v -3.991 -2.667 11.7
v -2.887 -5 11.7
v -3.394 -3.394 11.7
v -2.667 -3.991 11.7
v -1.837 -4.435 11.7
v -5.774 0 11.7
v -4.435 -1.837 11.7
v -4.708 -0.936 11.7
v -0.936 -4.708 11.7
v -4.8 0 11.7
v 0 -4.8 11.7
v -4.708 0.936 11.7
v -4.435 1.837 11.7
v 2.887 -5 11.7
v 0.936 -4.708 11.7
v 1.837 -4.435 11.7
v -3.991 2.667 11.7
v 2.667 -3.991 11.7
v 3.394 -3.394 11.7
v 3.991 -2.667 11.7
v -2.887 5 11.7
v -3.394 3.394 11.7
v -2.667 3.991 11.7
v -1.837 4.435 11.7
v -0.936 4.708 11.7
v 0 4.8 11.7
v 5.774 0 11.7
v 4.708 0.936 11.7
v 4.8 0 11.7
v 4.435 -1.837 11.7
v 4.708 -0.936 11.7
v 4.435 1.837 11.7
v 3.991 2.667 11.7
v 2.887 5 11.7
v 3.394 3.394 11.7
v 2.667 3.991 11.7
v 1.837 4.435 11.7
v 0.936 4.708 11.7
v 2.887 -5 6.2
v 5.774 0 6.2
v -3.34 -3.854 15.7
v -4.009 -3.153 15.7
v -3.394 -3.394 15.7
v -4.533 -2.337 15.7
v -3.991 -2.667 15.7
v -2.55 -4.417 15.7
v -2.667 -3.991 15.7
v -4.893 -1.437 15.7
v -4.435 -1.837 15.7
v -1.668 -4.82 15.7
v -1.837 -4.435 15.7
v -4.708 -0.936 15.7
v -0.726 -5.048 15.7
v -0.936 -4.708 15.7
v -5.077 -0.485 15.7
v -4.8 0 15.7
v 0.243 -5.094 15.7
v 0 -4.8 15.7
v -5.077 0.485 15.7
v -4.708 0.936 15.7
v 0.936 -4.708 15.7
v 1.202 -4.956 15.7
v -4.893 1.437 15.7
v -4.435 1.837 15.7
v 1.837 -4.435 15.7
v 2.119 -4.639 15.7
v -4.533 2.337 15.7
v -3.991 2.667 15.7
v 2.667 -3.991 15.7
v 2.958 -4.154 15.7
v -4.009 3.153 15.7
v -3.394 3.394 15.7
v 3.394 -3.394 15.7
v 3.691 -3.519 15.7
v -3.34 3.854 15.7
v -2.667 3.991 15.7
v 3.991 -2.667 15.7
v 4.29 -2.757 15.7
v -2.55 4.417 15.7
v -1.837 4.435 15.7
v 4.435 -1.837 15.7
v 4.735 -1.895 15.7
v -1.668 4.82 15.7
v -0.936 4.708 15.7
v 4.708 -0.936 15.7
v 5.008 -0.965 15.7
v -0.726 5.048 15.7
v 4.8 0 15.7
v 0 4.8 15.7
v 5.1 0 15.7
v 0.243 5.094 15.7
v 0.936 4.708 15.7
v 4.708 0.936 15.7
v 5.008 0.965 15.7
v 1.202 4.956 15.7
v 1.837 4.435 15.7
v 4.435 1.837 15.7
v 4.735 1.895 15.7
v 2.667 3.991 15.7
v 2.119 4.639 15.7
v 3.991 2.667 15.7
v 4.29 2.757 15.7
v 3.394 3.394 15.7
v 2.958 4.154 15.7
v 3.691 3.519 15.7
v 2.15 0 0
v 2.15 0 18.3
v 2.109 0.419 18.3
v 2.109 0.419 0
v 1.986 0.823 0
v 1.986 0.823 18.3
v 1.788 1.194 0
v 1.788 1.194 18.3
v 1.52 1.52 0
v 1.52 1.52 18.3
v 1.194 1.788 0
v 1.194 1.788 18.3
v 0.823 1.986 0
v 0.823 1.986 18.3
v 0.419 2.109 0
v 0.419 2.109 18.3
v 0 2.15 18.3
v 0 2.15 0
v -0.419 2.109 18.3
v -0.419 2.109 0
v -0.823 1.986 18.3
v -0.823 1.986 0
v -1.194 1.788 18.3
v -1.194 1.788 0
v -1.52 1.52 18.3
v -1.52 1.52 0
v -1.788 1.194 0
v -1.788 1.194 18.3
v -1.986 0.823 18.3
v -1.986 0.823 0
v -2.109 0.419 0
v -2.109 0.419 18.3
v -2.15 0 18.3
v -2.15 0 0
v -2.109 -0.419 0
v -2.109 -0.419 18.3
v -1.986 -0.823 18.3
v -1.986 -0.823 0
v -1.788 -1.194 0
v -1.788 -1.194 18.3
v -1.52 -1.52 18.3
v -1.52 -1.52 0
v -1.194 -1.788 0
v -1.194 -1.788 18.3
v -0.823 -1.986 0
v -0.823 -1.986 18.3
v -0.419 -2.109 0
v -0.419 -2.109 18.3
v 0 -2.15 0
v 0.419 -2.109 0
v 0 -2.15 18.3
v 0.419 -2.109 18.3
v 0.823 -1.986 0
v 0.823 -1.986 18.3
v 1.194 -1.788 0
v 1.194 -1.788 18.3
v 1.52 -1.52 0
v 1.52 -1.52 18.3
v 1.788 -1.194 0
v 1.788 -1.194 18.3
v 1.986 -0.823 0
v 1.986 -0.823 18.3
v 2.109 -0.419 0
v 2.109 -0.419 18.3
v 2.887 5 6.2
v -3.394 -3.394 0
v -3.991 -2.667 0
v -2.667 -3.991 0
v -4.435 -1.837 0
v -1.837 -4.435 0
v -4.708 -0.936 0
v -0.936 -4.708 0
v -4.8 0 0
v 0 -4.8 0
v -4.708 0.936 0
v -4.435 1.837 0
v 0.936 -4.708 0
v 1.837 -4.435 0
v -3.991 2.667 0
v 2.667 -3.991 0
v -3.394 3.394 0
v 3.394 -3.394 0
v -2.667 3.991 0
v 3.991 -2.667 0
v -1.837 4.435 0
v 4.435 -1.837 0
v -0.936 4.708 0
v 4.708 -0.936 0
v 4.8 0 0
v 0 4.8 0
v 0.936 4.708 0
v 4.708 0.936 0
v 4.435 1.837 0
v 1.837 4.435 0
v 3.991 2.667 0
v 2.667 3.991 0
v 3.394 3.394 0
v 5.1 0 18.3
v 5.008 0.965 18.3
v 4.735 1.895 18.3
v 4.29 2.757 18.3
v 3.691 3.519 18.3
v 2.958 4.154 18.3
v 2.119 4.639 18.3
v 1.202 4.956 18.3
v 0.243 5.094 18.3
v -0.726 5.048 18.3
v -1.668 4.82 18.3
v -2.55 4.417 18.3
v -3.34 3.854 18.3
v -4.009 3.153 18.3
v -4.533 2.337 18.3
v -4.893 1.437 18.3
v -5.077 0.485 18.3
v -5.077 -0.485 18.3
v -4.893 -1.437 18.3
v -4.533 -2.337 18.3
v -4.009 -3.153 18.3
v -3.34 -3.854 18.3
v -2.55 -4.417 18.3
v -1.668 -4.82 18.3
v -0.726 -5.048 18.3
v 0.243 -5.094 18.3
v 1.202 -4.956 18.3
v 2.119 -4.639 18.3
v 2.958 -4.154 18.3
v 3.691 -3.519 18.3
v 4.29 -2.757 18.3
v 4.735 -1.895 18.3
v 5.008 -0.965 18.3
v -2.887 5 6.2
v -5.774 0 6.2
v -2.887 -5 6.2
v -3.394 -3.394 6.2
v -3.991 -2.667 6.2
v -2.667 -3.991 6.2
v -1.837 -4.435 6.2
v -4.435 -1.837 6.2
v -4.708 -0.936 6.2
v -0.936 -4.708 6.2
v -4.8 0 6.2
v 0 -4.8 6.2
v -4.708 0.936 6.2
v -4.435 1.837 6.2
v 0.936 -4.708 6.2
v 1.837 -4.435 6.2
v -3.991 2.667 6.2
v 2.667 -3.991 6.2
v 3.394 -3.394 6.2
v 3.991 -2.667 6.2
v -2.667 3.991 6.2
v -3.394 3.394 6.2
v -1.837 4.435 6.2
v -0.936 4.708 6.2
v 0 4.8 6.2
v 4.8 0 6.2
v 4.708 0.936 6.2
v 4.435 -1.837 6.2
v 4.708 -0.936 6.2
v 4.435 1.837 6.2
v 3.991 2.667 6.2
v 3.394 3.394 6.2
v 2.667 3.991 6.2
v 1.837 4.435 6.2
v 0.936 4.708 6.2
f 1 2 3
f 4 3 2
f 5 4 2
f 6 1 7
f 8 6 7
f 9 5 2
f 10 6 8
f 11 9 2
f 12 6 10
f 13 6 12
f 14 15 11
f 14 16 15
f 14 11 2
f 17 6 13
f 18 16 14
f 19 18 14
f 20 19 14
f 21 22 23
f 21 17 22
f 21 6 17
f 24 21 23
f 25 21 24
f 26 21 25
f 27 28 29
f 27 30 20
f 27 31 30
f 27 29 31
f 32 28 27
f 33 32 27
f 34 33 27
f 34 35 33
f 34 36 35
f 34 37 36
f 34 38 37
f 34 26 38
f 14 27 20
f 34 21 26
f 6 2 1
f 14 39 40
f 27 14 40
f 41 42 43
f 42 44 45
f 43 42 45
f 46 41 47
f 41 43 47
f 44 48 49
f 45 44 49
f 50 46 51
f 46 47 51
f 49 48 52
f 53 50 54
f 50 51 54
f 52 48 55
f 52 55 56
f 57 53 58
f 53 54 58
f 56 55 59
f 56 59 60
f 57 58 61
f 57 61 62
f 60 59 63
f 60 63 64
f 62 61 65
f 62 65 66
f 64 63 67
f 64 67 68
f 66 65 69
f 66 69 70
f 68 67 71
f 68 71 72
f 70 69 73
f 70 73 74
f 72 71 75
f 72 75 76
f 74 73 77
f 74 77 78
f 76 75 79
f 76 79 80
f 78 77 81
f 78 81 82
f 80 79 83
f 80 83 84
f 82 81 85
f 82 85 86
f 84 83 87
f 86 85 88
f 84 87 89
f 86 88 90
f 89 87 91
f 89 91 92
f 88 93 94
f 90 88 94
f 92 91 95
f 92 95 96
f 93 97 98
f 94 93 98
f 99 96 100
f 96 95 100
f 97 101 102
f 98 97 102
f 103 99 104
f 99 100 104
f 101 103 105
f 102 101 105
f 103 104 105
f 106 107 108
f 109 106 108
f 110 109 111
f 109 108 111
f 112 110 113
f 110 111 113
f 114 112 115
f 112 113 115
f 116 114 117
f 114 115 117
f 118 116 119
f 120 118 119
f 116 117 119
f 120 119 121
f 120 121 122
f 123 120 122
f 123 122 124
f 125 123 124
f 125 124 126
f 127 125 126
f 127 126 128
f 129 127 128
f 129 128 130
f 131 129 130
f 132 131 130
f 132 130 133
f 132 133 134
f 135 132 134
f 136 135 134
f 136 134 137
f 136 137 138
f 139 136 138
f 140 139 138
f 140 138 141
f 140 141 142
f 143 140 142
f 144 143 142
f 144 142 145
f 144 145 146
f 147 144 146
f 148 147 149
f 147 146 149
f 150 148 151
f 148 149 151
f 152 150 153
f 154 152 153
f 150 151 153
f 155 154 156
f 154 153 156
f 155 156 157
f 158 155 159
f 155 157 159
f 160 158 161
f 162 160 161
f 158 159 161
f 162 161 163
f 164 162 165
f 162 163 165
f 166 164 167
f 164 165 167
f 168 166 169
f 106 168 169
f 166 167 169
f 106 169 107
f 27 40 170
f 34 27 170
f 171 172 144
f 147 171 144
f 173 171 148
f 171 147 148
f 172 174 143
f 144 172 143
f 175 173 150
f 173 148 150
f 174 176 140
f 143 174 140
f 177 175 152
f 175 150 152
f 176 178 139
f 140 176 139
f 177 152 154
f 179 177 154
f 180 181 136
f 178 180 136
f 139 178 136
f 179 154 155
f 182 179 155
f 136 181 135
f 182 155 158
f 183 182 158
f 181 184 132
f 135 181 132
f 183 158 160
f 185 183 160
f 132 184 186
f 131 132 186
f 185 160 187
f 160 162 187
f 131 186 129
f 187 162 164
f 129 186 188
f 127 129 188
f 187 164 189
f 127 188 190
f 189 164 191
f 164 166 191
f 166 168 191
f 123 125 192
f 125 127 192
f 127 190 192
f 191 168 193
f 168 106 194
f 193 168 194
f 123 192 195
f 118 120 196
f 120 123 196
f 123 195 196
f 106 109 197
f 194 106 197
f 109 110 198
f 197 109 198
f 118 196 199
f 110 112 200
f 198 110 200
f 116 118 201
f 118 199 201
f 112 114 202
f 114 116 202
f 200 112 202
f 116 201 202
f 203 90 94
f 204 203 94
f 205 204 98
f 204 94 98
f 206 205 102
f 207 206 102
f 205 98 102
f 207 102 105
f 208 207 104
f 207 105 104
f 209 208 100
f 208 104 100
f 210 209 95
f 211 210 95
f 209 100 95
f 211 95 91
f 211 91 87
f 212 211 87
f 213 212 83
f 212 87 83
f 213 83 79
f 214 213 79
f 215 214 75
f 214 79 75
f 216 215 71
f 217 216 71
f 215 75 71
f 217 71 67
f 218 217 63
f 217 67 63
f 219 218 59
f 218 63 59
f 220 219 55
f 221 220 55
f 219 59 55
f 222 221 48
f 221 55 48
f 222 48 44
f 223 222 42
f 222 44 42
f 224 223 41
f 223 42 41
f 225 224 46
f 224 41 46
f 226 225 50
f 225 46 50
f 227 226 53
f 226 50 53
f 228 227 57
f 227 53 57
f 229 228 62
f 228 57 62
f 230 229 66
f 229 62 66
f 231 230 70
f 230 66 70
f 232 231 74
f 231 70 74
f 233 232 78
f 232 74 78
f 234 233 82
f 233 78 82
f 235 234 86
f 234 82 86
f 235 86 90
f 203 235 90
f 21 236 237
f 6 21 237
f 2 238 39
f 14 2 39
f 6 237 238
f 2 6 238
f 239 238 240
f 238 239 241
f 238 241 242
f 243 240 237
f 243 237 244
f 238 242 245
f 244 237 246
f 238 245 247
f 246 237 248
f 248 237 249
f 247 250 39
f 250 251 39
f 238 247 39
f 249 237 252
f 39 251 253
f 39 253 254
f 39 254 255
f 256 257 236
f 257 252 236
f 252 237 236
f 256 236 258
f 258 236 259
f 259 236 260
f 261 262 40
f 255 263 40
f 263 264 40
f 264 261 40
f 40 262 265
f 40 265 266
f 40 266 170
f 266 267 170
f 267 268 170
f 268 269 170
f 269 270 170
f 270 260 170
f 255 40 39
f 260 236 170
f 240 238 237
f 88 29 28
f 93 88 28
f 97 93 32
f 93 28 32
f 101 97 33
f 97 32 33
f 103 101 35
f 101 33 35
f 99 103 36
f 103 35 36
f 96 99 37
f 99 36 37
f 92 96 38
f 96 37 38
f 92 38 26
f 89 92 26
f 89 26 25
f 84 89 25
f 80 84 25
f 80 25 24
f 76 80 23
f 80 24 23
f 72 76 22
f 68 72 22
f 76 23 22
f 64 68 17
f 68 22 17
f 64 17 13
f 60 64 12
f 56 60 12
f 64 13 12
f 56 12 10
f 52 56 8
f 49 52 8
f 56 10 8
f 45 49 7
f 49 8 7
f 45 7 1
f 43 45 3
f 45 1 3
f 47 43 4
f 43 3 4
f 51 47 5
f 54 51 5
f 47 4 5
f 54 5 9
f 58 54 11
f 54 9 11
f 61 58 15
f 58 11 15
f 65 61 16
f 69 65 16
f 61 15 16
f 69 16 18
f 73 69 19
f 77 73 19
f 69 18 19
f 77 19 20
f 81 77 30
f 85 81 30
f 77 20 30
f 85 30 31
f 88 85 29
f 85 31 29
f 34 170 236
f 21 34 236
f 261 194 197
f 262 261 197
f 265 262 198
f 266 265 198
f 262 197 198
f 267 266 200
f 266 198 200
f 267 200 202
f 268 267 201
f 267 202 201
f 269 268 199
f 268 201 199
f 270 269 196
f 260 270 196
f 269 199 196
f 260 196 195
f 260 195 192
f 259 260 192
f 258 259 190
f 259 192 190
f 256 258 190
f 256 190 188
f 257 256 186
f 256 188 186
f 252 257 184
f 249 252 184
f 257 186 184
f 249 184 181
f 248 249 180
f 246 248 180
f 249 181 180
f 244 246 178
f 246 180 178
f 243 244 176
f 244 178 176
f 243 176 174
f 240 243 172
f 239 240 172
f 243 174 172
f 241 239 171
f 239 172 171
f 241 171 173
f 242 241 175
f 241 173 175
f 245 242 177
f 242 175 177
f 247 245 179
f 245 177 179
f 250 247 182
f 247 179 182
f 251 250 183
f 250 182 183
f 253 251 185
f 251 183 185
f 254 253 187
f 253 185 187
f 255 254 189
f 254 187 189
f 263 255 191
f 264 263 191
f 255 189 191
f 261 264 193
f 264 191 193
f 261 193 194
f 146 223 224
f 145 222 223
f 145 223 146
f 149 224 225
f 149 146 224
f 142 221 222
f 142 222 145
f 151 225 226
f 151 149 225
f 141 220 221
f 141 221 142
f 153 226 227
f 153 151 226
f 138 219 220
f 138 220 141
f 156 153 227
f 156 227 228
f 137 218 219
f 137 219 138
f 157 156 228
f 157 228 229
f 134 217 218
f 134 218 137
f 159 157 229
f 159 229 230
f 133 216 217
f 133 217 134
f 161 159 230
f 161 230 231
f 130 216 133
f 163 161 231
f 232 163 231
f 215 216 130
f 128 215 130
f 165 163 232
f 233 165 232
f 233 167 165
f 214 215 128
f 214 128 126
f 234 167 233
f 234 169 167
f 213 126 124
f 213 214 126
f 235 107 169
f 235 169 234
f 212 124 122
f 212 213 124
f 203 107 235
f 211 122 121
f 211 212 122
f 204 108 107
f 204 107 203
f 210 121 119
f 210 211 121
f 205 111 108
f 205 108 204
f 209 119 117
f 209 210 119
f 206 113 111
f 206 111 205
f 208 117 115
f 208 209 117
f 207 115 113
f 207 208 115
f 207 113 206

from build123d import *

# Parameters (mm, degrees)
F0_R     = 4.8
F1_DEPTH = 6.2
F2_R     = 4.8
F3_DEPTH = 5.5
F4_R     = 4.8
F5_DEPTH = 4
F6_R     = 5.1
F6_R_2   = 4.8
F7_DEPTH = 2.6
F8_R     = 2.15
F9_DEPTH = 18.301


with BuildPart() as f1:
    # F0 (on Top) → F1 (new body)
    with BuildSketch(Plane.XY):
        Circle(F0_R)
    extrude(amount=F1_DEPTH)

    # F2 (on face) → F3 (join)
    with BuildSketch(Plane.XY.offset(6.2)):
        Polygon((2.8867513459, -5), (5.7735026919, 0), (2.8867513459, 5), (-2.8867513459, 5), (-5.7735026919, 0), (-2.8867513459, -5), align=None)
        Circle(F2_R, mode=Mode.SUBTRACT)
        Circle(F2_R)
    extrude(amount=F3_DEPTH)

    # F4 (on face) → F5 (join)
    with BuildSketch(Plane.XY.offset(11.7)):
        Circle(F4_R)
    extrude(amount=F5_DEPTH)

    # F6 (on face) → F7 (join)
    with BuildSketch(Plane.XY.offset(15.7)):
        Circle(F6_R)
        Circle(F6_R_2, mode=Mode.SUBTRACT)
        Circle(F6_R_2)
    extrude(amount=F7_DEPTH)

    # F8 (on face) → F9 (cut, through all)
    with BuildSketch(Plane.XY.offset(18.3)):
        Circle(F8_R)
    extrude(amount=-F9_DEPTH, mode=Mode.SUBTRACT)


solid = f1.part
